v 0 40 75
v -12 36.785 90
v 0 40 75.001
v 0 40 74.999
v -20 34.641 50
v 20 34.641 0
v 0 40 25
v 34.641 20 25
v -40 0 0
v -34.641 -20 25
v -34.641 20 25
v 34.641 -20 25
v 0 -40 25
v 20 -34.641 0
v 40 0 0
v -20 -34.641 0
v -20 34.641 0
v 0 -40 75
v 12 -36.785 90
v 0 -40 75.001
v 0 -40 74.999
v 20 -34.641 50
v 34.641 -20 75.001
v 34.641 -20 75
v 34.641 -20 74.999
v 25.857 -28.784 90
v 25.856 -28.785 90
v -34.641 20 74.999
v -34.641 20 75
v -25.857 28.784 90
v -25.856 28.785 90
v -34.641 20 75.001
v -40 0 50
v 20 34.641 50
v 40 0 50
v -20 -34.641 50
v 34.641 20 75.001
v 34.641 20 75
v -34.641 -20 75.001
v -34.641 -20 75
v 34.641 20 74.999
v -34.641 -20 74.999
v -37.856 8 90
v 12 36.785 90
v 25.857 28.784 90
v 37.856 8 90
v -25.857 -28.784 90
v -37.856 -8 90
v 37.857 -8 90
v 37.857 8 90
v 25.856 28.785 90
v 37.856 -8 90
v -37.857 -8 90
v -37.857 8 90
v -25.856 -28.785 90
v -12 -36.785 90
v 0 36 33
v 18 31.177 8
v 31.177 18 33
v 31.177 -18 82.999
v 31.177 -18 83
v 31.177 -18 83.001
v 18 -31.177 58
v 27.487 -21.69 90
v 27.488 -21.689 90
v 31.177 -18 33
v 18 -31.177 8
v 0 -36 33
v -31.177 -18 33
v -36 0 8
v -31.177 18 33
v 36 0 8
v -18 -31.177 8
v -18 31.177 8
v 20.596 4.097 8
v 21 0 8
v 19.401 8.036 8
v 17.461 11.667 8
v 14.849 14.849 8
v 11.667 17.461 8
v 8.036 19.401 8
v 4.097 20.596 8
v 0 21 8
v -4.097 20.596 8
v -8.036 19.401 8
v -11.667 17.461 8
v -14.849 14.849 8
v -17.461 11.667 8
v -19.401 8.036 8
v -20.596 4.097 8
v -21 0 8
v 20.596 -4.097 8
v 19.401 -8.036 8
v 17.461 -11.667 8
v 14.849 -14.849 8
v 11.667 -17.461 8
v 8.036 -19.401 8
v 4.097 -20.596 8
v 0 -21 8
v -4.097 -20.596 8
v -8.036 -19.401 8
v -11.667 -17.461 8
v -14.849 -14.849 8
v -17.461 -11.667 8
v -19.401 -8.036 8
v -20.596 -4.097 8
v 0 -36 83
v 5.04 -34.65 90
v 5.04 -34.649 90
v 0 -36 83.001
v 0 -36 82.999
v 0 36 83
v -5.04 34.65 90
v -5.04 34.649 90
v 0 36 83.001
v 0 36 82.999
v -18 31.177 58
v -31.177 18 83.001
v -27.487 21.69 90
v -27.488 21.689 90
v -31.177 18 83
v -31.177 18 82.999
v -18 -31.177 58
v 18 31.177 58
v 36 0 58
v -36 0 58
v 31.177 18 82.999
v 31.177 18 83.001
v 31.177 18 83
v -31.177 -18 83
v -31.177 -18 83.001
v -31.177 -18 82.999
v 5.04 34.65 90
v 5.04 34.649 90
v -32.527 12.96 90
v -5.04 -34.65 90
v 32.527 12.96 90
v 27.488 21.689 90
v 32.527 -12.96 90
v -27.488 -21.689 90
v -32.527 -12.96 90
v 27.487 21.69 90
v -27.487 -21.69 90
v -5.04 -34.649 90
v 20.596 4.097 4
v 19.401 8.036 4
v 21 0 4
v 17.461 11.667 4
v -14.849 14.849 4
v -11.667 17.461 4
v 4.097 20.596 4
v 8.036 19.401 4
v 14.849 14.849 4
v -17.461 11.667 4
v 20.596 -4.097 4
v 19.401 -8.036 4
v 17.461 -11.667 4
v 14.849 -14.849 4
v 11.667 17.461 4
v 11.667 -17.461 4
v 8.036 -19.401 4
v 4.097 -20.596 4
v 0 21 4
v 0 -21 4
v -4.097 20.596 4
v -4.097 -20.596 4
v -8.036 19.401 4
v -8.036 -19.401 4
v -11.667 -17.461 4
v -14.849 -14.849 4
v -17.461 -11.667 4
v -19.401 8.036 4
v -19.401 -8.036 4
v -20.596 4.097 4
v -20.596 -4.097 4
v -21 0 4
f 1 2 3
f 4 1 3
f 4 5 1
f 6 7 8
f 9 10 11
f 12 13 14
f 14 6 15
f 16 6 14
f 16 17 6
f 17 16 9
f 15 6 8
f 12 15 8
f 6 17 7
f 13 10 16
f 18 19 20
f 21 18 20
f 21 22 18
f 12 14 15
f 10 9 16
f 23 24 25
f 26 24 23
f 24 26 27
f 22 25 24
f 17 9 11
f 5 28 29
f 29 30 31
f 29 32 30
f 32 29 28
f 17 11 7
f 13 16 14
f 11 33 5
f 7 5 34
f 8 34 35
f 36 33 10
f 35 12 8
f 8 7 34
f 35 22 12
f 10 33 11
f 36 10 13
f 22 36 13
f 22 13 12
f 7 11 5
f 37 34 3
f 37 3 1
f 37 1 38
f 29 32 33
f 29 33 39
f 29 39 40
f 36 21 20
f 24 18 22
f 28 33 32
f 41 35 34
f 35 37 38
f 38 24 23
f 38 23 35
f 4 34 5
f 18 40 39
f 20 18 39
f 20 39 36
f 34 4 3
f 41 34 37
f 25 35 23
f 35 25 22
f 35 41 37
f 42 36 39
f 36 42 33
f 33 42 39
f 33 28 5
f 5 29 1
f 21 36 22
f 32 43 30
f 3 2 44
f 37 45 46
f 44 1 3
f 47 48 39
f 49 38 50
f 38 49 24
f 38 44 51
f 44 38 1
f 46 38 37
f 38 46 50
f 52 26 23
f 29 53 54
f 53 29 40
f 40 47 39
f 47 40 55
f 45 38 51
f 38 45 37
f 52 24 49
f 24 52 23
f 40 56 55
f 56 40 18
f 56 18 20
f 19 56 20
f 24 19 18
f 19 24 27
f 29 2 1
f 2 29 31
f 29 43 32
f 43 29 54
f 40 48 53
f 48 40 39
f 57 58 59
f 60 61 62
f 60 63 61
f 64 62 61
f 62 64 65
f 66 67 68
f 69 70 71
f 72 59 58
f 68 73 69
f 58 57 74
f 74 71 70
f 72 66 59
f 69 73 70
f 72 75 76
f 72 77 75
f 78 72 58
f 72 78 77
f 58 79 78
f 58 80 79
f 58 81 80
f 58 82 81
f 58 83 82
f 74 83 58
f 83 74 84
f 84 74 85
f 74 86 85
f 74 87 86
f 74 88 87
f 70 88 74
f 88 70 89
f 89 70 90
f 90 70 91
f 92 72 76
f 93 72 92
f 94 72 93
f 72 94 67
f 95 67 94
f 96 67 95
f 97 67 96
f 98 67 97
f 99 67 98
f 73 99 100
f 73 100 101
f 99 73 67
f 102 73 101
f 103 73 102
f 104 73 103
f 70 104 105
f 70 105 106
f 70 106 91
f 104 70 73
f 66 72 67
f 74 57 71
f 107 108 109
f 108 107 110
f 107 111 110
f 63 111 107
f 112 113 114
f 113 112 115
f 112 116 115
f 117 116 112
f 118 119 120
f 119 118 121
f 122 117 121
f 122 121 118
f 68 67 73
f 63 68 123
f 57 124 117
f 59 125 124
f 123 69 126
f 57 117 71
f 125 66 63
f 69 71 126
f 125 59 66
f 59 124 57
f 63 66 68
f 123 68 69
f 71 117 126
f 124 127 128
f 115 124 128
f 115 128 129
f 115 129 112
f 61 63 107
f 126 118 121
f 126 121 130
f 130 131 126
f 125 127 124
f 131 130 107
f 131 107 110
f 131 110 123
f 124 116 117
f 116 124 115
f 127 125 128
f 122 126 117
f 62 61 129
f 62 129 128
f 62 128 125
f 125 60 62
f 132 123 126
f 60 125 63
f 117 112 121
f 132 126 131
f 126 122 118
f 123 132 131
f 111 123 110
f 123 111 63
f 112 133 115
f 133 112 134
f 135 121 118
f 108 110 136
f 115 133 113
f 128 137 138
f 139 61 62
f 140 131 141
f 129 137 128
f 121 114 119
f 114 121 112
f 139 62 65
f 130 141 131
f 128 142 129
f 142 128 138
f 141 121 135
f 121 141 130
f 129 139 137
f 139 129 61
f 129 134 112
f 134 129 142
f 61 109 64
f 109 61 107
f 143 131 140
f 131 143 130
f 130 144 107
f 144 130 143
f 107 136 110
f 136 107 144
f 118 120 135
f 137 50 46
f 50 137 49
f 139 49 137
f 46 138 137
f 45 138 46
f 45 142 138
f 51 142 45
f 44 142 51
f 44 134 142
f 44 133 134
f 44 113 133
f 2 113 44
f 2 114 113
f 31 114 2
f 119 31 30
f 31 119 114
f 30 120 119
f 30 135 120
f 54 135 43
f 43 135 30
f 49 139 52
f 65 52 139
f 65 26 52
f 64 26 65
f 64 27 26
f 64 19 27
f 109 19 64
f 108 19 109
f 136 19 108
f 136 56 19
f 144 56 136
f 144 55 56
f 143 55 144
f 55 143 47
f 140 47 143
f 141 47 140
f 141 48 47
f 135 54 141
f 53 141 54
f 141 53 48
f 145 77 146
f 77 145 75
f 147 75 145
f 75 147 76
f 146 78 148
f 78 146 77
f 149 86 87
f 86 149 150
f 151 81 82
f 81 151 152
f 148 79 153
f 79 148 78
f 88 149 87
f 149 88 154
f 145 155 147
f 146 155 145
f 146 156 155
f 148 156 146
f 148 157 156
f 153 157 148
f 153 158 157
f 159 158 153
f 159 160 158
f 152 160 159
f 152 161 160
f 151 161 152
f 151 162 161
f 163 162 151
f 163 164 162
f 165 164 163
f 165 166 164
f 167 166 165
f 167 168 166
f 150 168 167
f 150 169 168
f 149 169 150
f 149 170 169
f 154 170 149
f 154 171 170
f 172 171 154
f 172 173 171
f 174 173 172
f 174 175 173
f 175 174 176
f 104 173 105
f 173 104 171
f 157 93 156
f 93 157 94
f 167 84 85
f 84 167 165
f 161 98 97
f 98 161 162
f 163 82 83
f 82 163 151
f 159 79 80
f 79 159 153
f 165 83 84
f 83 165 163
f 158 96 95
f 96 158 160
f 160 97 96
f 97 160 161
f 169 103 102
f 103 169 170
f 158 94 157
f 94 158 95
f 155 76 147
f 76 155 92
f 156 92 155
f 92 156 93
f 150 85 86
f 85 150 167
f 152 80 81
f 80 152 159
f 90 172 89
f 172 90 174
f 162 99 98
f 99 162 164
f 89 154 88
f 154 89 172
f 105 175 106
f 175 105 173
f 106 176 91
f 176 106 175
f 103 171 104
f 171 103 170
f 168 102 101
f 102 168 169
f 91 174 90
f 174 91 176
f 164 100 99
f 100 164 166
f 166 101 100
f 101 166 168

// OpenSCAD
$fn = 6;



difference() {
mike();
translate([0, 0, 8]) scale([0.90, 0.9, 1]) mike();

translate([0, 0, s_height*4]) cube([100, 100, 20], center=true);


translate([0, 0, 6]) cylinder(h=04, r1=21,r2=21, center=true, $fn=32);
}





module mike()
{
section();
rotate([0, 0, 30]) translate([0, 0, s_height]) section();
translate([0, 0, s_height*2]) section();
rotate([0, 0, 30]) translate([0, 0, s_height*3]) section();
}


s_radius = 40;
s_height = 25;



module section()
{
	hull()
	{
		cylinder(h=0.001, r1=s_radius,r2=s_radius, center=true);
		rotate([0, 0, 30]) translate([0, 0, s_height]) cylinder(h=0.001, r1=s_radius,r2=s_radius, center=true);
	}
}


/*
difference() {
mike();
translate([0, 0, 2]) scale([0.90, 0.9, 1]) mike();

translate([0, 0, 20]) cube([100, 100, 1], center=true);

}


module mike()
{
bob();
rotate([0, 0, 30]) translate([0, 0, 5]) bob();
translate([0, 0, 10]) bob();
rotate([0, 0, 30]) translate([0, 0, 15]) bob();
}


module bob()
{
hull() {
cylinder(h=0.001, r1=10,r2=10, center=true);




rotate([0, 0, 30]) translate([0, 0, 5]) cylinder(h=0.001, r1=10,r2=10, center=true);
}


}
*/
